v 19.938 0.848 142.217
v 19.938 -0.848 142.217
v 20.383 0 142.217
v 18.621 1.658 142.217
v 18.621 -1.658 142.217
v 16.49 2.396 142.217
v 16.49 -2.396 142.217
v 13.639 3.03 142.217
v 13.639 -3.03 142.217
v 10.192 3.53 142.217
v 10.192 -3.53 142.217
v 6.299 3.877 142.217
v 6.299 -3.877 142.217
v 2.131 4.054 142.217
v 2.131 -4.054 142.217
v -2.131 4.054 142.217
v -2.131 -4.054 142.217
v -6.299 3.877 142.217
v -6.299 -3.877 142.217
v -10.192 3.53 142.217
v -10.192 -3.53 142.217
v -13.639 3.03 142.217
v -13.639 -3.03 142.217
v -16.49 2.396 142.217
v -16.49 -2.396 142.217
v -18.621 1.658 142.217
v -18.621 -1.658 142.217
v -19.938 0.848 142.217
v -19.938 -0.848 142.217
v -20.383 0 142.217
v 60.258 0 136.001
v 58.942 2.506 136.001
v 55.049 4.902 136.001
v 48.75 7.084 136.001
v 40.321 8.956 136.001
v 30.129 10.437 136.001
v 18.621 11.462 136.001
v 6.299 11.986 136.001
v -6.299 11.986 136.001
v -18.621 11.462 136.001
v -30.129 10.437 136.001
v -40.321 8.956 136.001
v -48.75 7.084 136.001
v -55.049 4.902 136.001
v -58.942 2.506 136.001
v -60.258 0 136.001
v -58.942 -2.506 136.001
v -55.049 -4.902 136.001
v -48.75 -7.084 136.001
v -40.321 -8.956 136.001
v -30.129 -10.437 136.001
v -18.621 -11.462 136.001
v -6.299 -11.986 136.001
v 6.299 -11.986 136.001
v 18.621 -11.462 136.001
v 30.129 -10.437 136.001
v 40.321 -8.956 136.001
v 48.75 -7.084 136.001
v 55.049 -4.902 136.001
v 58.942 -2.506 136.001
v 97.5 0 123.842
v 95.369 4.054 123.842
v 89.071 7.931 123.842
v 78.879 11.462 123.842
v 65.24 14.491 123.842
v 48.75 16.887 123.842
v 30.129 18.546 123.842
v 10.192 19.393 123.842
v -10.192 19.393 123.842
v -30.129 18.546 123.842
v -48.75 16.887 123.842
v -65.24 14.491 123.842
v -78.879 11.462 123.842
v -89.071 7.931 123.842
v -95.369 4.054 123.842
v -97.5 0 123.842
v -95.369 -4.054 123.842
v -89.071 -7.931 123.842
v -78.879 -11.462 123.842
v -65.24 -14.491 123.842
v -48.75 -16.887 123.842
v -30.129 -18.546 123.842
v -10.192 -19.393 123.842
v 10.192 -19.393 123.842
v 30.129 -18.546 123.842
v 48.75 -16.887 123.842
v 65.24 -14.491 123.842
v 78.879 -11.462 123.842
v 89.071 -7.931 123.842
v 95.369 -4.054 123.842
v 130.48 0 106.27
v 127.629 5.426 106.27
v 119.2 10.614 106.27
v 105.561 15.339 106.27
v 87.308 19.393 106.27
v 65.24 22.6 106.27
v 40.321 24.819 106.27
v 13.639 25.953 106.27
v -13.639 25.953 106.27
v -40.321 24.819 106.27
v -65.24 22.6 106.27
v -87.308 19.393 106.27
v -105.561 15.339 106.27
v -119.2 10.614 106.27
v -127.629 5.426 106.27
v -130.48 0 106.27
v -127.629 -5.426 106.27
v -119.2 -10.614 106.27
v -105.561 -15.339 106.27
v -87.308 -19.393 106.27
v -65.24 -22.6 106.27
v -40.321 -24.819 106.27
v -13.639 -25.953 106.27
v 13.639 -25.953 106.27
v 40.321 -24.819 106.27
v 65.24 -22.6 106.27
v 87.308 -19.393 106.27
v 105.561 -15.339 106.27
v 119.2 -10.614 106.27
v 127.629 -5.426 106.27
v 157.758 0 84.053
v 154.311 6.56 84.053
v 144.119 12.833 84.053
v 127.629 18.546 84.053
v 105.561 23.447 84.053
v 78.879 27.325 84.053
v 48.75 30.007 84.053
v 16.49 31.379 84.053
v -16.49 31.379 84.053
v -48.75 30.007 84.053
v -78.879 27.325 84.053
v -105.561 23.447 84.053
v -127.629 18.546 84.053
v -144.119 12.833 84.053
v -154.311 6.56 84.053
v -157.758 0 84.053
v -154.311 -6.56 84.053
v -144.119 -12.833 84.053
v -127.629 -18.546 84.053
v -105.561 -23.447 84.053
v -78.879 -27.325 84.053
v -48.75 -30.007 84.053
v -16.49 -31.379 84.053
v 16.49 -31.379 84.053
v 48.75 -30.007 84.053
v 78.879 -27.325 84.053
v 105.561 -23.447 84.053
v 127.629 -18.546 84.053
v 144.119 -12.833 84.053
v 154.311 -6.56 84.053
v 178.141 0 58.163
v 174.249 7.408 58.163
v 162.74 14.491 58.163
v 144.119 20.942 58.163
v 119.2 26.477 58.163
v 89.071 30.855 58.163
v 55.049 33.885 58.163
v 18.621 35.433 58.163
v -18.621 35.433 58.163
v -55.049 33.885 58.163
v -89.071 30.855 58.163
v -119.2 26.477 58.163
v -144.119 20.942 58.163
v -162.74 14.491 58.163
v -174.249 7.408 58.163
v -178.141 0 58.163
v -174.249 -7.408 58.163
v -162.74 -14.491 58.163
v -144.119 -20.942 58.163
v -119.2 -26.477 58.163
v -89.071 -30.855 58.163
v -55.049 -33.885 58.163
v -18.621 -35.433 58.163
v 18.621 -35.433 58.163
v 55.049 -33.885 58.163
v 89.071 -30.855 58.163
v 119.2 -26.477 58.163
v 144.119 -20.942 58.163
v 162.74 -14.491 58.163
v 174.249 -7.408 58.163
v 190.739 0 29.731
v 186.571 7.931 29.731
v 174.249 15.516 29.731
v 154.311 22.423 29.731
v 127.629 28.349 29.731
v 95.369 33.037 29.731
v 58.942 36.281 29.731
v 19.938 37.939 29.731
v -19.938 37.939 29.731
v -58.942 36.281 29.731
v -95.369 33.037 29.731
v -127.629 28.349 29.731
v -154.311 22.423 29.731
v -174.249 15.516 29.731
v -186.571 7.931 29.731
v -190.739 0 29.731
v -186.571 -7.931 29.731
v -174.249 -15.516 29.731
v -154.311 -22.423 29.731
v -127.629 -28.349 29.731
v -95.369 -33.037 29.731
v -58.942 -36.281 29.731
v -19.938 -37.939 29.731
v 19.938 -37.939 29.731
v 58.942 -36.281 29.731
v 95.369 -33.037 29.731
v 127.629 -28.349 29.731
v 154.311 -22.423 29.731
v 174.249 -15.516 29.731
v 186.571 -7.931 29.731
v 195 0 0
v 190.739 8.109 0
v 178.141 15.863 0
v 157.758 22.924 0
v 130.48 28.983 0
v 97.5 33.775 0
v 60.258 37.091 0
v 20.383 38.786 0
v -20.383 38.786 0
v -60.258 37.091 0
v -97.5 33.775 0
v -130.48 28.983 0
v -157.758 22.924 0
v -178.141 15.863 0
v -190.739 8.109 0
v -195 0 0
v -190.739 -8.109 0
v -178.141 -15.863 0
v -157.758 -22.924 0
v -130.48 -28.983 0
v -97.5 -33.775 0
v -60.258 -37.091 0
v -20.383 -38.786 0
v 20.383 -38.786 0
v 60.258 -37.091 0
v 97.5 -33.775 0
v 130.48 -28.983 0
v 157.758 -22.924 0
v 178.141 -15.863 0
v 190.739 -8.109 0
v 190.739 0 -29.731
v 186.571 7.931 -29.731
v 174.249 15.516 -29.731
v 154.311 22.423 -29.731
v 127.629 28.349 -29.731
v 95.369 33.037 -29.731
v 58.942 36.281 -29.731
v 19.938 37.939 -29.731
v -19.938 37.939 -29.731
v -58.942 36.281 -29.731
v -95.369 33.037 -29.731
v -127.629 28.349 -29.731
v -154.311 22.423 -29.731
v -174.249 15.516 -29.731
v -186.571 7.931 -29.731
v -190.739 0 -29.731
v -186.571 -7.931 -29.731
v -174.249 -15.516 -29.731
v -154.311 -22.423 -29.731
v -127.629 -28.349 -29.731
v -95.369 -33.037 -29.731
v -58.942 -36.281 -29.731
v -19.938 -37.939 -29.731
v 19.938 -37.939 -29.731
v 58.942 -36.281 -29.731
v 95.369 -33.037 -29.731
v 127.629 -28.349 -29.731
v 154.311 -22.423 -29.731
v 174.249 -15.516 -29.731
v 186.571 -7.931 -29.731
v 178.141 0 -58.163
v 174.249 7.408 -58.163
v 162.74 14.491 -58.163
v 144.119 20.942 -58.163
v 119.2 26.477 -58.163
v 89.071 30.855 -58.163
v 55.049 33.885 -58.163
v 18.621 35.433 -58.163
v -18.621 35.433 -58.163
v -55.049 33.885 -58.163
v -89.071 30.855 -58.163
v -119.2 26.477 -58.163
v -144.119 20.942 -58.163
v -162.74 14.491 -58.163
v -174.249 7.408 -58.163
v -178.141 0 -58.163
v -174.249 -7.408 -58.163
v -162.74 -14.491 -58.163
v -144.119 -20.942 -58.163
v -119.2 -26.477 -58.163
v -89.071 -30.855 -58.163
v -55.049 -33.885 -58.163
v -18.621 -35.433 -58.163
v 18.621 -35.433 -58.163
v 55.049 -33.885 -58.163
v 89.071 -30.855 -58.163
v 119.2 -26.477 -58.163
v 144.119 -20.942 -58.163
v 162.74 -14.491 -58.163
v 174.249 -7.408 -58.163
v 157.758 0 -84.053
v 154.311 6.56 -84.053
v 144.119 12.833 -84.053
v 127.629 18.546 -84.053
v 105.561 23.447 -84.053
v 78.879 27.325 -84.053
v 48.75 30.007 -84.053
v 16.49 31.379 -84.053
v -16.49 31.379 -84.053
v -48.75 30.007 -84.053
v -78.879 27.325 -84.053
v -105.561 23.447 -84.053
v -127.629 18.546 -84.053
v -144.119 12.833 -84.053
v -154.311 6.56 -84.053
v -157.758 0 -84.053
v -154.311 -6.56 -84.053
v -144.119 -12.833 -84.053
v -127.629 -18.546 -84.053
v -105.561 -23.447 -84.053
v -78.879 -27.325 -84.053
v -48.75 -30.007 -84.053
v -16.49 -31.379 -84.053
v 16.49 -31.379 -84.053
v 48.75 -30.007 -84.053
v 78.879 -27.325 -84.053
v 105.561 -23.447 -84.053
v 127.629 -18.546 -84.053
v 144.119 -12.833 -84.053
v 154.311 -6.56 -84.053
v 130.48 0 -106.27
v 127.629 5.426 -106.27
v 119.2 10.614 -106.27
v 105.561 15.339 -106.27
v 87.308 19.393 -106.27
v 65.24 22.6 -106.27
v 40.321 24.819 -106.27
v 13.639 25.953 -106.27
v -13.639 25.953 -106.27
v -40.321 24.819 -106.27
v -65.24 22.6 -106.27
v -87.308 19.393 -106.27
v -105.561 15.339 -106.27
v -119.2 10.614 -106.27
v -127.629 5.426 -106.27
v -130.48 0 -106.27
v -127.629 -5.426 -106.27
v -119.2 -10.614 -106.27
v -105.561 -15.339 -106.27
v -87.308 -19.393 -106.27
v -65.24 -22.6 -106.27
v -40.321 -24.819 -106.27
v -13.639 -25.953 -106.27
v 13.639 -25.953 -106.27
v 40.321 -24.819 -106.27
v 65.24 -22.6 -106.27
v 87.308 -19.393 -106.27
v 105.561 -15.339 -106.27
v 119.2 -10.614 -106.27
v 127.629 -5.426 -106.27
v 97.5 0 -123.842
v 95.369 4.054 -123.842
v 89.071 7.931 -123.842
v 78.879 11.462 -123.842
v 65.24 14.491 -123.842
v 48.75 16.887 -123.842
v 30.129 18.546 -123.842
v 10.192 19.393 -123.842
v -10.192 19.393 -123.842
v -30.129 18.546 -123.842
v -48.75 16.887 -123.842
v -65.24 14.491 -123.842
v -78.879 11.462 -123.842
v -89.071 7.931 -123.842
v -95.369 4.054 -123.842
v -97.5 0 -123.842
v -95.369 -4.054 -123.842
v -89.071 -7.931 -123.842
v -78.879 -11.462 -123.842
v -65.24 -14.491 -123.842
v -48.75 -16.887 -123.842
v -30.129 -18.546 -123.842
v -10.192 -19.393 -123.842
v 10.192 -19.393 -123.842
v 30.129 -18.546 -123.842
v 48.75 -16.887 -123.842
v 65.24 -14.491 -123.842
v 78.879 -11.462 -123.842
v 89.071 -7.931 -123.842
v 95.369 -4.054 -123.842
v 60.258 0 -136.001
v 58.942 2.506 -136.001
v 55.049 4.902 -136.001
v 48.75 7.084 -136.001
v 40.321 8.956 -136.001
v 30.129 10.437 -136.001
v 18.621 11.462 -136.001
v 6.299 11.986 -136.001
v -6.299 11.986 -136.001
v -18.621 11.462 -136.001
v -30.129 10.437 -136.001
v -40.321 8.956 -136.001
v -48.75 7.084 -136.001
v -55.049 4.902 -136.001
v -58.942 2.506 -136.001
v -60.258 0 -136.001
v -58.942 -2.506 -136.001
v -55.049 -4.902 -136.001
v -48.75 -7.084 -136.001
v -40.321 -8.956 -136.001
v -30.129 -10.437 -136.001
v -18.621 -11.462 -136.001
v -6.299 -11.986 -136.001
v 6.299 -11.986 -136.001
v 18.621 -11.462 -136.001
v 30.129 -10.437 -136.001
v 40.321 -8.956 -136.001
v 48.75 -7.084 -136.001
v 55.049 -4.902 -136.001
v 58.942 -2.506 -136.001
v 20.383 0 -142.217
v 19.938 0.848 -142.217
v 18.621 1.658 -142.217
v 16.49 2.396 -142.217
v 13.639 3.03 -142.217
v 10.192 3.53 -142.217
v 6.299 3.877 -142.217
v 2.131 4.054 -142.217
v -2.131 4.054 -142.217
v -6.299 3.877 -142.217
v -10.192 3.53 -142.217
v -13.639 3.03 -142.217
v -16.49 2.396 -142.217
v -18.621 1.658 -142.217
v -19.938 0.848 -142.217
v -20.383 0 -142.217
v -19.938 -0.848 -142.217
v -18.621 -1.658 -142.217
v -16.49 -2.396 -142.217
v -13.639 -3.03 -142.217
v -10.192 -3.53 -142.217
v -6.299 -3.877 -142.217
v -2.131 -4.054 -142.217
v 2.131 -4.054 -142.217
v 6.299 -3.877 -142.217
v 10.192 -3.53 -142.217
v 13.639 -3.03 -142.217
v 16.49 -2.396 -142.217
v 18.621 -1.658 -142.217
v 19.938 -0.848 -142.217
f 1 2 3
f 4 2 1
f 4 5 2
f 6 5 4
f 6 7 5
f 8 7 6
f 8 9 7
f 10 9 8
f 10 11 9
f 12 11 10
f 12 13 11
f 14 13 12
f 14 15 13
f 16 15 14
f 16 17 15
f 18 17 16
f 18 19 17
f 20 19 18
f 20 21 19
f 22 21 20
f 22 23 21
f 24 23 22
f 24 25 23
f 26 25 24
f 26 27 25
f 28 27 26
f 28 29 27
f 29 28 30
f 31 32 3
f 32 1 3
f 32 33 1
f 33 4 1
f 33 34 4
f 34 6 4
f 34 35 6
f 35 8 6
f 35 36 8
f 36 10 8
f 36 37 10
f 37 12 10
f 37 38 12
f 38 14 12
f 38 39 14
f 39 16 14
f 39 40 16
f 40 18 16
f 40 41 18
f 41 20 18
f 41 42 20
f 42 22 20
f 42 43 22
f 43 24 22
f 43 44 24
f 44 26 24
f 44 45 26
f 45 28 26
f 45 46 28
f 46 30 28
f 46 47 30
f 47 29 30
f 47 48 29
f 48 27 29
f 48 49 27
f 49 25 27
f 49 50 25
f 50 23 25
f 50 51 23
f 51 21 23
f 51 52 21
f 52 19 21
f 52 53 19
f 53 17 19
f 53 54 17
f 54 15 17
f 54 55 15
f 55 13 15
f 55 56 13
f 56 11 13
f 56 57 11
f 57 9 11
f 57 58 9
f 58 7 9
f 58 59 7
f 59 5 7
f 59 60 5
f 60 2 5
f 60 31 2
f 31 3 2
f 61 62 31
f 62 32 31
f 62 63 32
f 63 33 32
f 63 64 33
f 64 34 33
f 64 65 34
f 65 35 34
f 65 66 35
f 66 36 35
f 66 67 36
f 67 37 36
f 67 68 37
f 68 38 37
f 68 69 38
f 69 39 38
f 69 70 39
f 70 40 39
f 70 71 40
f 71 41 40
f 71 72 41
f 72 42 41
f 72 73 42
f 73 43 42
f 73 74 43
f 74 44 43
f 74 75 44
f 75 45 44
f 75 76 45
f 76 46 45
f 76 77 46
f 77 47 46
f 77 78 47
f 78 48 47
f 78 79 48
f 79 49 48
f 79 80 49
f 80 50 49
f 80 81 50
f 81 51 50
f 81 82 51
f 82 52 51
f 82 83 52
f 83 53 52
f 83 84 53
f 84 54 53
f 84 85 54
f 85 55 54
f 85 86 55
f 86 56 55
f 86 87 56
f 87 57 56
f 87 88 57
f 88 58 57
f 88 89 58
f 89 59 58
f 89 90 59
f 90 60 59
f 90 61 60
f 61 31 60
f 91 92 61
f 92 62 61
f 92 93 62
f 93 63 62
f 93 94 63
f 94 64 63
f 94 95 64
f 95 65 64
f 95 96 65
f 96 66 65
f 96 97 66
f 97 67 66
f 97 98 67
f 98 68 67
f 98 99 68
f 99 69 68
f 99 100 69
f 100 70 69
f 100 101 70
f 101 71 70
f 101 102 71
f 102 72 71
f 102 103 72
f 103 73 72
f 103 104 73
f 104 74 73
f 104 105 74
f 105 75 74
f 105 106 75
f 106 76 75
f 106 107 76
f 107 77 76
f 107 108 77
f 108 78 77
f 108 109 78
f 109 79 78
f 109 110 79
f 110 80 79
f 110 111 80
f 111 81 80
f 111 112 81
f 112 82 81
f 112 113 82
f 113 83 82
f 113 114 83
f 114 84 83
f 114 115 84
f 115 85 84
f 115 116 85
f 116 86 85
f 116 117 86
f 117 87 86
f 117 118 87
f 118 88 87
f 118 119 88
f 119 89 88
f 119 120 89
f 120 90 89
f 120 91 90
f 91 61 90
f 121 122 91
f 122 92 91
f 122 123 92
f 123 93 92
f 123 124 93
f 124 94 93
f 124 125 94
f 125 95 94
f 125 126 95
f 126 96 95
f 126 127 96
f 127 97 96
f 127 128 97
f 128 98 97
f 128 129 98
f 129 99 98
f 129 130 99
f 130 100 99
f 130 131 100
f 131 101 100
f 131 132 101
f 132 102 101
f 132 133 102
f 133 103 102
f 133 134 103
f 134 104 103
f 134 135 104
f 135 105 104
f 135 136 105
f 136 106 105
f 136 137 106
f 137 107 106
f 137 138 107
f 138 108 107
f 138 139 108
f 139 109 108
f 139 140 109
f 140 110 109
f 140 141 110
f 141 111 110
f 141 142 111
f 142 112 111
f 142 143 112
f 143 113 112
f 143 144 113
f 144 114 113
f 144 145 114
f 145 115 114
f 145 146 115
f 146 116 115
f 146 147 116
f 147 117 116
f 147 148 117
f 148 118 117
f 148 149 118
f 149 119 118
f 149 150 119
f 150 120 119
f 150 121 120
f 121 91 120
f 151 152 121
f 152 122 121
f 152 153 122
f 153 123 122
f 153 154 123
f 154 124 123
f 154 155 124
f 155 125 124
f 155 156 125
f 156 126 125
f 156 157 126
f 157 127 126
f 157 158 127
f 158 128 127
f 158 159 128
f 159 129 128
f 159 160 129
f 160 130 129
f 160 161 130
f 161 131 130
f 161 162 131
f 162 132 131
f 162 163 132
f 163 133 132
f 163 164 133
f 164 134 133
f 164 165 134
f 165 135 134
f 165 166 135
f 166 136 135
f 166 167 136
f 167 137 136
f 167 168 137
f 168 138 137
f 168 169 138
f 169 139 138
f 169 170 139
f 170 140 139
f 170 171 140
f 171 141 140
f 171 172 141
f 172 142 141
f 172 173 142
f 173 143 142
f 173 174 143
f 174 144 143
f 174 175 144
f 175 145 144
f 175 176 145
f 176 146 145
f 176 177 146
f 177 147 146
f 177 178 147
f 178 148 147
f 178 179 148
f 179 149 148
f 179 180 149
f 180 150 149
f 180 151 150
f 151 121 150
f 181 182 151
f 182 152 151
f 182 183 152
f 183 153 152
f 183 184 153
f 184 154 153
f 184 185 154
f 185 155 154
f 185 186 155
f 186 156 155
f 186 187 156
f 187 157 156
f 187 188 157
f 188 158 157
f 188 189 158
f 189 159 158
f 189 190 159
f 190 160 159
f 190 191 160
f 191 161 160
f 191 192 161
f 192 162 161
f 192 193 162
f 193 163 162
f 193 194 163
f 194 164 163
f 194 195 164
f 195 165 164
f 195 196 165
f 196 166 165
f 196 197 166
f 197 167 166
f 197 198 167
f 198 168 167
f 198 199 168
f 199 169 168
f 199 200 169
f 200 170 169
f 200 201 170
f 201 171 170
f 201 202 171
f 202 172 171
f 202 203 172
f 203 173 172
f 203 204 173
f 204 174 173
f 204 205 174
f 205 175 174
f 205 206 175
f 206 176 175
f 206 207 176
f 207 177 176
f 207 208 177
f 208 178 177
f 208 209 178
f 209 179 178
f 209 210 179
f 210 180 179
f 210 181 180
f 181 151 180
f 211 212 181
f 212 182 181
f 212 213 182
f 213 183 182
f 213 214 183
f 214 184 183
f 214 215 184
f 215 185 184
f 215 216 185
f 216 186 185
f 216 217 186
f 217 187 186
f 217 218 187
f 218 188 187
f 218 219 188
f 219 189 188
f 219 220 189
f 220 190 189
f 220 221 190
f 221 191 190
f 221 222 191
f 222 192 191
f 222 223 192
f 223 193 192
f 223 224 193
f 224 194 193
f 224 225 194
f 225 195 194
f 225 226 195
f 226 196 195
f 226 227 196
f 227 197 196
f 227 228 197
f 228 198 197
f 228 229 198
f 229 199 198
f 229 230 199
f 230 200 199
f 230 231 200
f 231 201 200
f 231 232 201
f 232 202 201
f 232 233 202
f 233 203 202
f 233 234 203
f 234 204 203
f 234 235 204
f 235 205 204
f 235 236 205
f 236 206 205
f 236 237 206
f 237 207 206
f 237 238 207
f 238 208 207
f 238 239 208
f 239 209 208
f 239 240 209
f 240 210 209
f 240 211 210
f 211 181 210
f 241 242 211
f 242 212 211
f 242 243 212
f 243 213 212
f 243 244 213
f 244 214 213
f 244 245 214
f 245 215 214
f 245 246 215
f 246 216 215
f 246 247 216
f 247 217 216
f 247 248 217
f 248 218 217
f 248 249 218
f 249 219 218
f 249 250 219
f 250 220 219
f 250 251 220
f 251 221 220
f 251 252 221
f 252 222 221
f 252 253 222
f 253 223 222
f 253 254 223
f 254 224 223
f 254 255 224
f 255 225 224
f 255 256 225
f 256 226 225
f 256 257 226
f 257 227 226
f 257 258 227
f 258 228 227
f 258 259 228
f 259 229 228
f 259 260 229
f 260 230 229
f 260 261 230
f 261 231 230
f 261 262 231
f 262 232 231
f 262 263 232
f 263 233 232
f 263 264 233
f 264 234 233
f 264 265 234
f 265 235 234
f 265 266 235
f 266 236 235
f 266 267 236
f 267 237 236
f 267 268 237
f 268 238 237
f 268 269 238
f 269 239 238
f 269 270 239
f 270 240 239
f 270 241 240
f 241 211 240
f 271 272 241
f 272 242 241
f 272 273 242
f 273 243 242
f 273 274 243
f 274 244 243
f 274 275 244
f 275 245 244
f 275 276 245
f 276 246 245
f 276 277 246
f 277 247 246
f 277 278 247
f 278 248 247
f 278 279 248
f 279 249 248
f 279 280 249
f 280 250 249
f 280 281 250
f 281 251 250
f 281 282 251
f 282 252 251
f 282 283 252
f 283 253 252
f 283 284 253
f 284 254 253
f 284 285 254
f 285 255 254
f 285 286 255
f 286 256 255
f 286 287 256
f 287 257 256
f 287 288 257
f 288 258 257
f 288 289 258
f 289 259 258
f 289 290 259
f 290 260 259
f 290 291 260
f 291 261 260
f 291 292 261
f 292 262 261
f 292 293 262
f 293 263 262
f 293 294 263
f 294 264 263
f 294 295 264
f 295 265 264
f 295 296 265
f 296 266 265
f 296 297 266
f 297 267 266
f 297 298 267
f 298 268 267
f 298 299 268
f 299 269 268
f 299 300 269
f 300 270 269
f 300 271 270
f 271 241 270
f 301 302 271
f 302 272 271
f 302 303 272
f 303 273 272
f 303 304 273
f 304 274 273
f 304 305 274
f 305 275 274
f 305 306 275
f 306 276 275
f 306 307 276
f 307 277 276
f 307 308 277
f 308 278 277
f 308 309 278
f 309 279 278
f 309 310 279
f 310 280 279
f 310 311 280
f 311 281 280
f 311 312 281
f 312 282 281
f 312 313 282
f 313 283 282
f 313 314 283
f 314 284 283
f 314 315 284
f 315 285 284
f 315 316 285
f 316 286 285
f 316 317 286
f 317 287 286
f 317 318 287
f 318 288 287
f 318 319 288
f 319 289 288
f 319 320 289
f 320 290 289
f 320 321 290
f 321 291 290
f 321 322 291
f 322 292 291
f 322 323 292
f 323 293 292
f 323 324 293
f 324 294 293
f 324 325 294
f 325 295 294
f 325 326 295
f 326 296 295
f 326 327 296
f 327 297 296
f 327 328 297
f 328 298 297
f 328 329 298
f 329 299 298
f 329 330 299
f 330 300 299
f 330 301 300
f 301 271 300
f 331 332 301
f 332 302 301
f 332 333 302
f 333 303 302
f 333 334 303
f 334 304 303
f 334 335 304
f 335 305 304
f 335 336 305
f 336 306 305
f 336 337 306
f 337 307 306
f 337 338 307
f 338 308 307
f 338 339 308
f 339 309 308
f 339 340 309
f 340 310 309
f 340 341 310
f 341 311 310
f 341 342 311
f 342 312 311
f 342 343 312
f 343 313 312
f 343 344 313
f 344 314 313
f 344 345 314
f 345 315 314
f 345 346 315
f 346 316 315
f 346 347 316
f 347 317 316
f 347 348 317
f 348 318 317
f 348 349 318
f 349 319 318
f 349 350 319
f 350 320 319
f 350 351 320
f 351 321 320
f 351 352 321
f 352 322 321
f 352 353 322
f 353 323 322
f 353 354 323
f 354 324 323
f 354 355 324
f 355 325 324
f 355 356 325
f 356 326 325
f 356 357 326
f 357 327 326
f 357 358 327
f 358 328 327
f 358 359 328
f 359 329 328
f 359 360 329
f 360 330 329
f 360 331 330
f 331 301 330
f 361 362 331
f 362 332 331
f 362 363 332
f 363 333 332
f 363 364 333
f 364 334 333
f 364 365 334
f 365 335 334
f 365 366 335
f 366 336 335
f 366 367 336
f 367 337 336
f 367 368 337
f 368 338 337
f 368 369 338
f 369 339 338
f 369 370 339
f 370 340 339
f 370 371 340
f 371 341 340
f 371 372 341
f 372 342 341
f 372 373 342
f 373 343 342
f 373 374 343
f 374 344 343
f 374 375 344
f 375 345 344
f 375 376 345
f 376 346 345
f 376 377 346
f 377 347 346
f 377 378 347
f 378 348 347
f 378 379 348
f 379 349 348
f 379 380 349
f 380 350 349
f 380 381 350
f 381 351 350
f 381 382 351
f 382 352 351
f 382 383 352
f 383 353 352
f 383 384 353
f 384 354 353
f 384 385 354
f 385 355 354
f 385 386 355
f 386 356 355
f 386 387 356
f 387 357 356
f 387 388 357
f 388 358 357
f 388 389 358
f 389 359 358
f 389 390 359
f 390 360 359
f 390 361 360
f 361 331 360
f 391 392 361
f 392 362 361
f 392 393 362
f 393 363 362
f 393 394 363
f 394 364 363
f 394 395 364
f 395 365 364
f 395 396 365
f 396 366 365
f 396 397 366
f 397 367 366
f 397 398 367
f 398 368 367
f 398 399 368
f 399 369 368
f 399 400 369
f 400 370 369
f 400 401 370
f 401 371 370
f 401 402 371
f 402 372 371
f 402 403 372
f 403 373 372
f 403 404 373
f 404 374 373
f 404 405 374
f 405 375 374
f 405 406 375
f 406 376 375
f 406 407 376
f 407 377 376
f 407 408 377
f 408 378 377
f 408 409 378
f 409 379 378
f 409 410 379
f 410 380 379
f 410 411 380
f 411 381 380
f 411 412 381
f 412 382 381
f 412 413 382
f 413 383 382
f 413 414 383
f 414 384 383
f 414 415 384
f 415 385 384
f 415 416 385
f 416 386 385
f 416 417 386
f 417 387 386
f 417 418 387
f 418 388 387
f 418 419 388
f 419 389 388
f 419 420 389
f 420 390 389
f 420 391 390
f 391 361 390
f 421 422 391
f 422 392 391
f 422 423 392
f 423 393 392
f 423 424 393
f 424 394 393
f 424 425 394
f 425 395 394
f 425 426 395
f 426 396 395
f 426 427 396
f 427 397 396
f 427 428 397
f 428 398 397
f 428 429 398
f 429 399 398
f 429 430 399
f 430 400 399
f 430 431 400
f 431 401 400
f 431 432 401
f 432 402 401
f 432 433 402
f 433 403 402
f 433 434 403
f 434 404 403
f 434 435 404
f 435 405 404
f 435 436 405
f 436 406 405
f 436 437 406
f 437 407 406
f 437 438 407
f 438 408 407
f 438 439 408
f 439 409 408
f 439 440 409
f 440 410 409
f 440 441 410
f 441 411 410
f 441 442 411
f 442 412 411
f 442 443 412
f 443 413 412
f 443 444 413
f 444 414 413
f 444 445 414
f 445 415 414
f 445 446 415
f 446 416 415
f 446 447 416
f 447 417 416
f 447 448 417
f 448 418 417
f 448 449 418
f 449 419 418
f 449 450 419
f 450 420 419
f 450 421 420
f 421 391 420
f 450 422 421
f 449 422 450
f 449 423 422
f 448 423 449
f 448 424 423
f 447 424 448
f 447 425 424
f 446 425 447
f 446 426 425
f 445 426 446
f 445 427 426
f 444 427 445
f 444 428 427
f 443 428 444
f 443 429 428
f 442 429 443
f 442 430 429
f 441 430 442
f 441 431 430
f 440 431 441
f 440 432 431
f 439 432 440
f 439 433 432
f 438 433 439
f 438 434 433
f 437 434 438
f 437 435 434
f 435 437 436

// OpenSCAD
// Generated by SolidPython 1.0.1 on 2020-07-29 00:46:51


scale(v = [15, 3, 11]) {
	sphere(r = 13);
}
/***********************************************
*********      SolidPython code:      **********
************************************************
 
# import packages: SolidPython
from solid import *
from solid.utils import *
from itertools import chain, combinations, permutations


class Resize:

    def __init__(self, scad_file):
        self.scad_file = scad_file
        #self.scad_file = import_scad(scad_file)
        # cone/cylinder param:
        self.r1 = 0
        self.r2 = 0
        self.h = 0
        # rectangular prism param:
        self.w = 0
        self.l = 0
        # ellipse param:
        self.r = 0

    # import OpenScad code (file name corresponds to shape)


    # classify shape + parameters
    def assign(self, param1, param2, param3):
        if self.scad_file == 'cone.scad':
            self.r1 = param1
            self.r2 = param2
            self.h = param3
        elif self.scad_file == 'cylinder.scad':
            self.r1 = param1
            self.r2 = param2
            self.h = param3
        elif self.scad_file == 'rectangularPrism.scad':
            self.h = param1
            self.l = param2
            self.w = param3
        else:
            self.r = param1
            self.h = param2

    # resize parameters
    def iterate(self):
        x = range(3, 20, 2)
        i = 1
        if self.scad_file == 'cone.scad':
            tempList = list(permutations(x, 2))
            for temp in tempList:
                param1 = temp[0]
                param2 = temp[1]
                filepath = 'produced_scad_files/' + 'cone' + str(param1) + '_' + str(param2) + '_' + '.scad'
                scad_render_to_file(cylinder(h=param1, r1=param2, r2=0), filepath)

        elif self.scad_file == 'cylinder.scad':
            tempList = list(permutations(x, 3))
            for temp in tempList:
                param1 = temp[0]
                param2 = temp[1]
                filepath = 'produced_scad_files/' + 'cylinder' + str(param1) + '_' + str(param2) + '_' + '.scad'
                scad_render_to_file(cylinder(h=param1, r1=param2, r2=param2), filepath)

        elif self.scad_file == 'rectangularPrism.scad':
            tempList = list(permutations(x, 3))
            for temp in tempList:
                param1 = temp[0]
                param2 = temp[1]
                param3 = temp[2]
                filepath = 'produced_scad_files/' + 'rectangularPrism' + str(param1) + '_' + str(param2) + '_' + str(
                    param3) + '.scad'
                scad_render_to_file(cube(size=(param1, param2, param3)), filepath)

        elif self.scad_file == 'ellipse.scad':
            tempList = list(permutations(x, 4))
            for temp in tempList:
                param1 = temp[0]
                param2 = temp[1]
                param3 = temp[2]
                param4 = temp[3]
                filepath = 'produced_scad_files/' + 'ellipse' + str(param1) + '_' + str(param2) + '_' + str(param3) + '_' + str(param4) + '.scad'
                scad_render_to_file(scale([param1, param2, param3])(sphere(r=param4)), filepath)

    def render_to_scadfile(self):
        scad_render_to_file(scad, 'example.scad') 
 
************************************************/
